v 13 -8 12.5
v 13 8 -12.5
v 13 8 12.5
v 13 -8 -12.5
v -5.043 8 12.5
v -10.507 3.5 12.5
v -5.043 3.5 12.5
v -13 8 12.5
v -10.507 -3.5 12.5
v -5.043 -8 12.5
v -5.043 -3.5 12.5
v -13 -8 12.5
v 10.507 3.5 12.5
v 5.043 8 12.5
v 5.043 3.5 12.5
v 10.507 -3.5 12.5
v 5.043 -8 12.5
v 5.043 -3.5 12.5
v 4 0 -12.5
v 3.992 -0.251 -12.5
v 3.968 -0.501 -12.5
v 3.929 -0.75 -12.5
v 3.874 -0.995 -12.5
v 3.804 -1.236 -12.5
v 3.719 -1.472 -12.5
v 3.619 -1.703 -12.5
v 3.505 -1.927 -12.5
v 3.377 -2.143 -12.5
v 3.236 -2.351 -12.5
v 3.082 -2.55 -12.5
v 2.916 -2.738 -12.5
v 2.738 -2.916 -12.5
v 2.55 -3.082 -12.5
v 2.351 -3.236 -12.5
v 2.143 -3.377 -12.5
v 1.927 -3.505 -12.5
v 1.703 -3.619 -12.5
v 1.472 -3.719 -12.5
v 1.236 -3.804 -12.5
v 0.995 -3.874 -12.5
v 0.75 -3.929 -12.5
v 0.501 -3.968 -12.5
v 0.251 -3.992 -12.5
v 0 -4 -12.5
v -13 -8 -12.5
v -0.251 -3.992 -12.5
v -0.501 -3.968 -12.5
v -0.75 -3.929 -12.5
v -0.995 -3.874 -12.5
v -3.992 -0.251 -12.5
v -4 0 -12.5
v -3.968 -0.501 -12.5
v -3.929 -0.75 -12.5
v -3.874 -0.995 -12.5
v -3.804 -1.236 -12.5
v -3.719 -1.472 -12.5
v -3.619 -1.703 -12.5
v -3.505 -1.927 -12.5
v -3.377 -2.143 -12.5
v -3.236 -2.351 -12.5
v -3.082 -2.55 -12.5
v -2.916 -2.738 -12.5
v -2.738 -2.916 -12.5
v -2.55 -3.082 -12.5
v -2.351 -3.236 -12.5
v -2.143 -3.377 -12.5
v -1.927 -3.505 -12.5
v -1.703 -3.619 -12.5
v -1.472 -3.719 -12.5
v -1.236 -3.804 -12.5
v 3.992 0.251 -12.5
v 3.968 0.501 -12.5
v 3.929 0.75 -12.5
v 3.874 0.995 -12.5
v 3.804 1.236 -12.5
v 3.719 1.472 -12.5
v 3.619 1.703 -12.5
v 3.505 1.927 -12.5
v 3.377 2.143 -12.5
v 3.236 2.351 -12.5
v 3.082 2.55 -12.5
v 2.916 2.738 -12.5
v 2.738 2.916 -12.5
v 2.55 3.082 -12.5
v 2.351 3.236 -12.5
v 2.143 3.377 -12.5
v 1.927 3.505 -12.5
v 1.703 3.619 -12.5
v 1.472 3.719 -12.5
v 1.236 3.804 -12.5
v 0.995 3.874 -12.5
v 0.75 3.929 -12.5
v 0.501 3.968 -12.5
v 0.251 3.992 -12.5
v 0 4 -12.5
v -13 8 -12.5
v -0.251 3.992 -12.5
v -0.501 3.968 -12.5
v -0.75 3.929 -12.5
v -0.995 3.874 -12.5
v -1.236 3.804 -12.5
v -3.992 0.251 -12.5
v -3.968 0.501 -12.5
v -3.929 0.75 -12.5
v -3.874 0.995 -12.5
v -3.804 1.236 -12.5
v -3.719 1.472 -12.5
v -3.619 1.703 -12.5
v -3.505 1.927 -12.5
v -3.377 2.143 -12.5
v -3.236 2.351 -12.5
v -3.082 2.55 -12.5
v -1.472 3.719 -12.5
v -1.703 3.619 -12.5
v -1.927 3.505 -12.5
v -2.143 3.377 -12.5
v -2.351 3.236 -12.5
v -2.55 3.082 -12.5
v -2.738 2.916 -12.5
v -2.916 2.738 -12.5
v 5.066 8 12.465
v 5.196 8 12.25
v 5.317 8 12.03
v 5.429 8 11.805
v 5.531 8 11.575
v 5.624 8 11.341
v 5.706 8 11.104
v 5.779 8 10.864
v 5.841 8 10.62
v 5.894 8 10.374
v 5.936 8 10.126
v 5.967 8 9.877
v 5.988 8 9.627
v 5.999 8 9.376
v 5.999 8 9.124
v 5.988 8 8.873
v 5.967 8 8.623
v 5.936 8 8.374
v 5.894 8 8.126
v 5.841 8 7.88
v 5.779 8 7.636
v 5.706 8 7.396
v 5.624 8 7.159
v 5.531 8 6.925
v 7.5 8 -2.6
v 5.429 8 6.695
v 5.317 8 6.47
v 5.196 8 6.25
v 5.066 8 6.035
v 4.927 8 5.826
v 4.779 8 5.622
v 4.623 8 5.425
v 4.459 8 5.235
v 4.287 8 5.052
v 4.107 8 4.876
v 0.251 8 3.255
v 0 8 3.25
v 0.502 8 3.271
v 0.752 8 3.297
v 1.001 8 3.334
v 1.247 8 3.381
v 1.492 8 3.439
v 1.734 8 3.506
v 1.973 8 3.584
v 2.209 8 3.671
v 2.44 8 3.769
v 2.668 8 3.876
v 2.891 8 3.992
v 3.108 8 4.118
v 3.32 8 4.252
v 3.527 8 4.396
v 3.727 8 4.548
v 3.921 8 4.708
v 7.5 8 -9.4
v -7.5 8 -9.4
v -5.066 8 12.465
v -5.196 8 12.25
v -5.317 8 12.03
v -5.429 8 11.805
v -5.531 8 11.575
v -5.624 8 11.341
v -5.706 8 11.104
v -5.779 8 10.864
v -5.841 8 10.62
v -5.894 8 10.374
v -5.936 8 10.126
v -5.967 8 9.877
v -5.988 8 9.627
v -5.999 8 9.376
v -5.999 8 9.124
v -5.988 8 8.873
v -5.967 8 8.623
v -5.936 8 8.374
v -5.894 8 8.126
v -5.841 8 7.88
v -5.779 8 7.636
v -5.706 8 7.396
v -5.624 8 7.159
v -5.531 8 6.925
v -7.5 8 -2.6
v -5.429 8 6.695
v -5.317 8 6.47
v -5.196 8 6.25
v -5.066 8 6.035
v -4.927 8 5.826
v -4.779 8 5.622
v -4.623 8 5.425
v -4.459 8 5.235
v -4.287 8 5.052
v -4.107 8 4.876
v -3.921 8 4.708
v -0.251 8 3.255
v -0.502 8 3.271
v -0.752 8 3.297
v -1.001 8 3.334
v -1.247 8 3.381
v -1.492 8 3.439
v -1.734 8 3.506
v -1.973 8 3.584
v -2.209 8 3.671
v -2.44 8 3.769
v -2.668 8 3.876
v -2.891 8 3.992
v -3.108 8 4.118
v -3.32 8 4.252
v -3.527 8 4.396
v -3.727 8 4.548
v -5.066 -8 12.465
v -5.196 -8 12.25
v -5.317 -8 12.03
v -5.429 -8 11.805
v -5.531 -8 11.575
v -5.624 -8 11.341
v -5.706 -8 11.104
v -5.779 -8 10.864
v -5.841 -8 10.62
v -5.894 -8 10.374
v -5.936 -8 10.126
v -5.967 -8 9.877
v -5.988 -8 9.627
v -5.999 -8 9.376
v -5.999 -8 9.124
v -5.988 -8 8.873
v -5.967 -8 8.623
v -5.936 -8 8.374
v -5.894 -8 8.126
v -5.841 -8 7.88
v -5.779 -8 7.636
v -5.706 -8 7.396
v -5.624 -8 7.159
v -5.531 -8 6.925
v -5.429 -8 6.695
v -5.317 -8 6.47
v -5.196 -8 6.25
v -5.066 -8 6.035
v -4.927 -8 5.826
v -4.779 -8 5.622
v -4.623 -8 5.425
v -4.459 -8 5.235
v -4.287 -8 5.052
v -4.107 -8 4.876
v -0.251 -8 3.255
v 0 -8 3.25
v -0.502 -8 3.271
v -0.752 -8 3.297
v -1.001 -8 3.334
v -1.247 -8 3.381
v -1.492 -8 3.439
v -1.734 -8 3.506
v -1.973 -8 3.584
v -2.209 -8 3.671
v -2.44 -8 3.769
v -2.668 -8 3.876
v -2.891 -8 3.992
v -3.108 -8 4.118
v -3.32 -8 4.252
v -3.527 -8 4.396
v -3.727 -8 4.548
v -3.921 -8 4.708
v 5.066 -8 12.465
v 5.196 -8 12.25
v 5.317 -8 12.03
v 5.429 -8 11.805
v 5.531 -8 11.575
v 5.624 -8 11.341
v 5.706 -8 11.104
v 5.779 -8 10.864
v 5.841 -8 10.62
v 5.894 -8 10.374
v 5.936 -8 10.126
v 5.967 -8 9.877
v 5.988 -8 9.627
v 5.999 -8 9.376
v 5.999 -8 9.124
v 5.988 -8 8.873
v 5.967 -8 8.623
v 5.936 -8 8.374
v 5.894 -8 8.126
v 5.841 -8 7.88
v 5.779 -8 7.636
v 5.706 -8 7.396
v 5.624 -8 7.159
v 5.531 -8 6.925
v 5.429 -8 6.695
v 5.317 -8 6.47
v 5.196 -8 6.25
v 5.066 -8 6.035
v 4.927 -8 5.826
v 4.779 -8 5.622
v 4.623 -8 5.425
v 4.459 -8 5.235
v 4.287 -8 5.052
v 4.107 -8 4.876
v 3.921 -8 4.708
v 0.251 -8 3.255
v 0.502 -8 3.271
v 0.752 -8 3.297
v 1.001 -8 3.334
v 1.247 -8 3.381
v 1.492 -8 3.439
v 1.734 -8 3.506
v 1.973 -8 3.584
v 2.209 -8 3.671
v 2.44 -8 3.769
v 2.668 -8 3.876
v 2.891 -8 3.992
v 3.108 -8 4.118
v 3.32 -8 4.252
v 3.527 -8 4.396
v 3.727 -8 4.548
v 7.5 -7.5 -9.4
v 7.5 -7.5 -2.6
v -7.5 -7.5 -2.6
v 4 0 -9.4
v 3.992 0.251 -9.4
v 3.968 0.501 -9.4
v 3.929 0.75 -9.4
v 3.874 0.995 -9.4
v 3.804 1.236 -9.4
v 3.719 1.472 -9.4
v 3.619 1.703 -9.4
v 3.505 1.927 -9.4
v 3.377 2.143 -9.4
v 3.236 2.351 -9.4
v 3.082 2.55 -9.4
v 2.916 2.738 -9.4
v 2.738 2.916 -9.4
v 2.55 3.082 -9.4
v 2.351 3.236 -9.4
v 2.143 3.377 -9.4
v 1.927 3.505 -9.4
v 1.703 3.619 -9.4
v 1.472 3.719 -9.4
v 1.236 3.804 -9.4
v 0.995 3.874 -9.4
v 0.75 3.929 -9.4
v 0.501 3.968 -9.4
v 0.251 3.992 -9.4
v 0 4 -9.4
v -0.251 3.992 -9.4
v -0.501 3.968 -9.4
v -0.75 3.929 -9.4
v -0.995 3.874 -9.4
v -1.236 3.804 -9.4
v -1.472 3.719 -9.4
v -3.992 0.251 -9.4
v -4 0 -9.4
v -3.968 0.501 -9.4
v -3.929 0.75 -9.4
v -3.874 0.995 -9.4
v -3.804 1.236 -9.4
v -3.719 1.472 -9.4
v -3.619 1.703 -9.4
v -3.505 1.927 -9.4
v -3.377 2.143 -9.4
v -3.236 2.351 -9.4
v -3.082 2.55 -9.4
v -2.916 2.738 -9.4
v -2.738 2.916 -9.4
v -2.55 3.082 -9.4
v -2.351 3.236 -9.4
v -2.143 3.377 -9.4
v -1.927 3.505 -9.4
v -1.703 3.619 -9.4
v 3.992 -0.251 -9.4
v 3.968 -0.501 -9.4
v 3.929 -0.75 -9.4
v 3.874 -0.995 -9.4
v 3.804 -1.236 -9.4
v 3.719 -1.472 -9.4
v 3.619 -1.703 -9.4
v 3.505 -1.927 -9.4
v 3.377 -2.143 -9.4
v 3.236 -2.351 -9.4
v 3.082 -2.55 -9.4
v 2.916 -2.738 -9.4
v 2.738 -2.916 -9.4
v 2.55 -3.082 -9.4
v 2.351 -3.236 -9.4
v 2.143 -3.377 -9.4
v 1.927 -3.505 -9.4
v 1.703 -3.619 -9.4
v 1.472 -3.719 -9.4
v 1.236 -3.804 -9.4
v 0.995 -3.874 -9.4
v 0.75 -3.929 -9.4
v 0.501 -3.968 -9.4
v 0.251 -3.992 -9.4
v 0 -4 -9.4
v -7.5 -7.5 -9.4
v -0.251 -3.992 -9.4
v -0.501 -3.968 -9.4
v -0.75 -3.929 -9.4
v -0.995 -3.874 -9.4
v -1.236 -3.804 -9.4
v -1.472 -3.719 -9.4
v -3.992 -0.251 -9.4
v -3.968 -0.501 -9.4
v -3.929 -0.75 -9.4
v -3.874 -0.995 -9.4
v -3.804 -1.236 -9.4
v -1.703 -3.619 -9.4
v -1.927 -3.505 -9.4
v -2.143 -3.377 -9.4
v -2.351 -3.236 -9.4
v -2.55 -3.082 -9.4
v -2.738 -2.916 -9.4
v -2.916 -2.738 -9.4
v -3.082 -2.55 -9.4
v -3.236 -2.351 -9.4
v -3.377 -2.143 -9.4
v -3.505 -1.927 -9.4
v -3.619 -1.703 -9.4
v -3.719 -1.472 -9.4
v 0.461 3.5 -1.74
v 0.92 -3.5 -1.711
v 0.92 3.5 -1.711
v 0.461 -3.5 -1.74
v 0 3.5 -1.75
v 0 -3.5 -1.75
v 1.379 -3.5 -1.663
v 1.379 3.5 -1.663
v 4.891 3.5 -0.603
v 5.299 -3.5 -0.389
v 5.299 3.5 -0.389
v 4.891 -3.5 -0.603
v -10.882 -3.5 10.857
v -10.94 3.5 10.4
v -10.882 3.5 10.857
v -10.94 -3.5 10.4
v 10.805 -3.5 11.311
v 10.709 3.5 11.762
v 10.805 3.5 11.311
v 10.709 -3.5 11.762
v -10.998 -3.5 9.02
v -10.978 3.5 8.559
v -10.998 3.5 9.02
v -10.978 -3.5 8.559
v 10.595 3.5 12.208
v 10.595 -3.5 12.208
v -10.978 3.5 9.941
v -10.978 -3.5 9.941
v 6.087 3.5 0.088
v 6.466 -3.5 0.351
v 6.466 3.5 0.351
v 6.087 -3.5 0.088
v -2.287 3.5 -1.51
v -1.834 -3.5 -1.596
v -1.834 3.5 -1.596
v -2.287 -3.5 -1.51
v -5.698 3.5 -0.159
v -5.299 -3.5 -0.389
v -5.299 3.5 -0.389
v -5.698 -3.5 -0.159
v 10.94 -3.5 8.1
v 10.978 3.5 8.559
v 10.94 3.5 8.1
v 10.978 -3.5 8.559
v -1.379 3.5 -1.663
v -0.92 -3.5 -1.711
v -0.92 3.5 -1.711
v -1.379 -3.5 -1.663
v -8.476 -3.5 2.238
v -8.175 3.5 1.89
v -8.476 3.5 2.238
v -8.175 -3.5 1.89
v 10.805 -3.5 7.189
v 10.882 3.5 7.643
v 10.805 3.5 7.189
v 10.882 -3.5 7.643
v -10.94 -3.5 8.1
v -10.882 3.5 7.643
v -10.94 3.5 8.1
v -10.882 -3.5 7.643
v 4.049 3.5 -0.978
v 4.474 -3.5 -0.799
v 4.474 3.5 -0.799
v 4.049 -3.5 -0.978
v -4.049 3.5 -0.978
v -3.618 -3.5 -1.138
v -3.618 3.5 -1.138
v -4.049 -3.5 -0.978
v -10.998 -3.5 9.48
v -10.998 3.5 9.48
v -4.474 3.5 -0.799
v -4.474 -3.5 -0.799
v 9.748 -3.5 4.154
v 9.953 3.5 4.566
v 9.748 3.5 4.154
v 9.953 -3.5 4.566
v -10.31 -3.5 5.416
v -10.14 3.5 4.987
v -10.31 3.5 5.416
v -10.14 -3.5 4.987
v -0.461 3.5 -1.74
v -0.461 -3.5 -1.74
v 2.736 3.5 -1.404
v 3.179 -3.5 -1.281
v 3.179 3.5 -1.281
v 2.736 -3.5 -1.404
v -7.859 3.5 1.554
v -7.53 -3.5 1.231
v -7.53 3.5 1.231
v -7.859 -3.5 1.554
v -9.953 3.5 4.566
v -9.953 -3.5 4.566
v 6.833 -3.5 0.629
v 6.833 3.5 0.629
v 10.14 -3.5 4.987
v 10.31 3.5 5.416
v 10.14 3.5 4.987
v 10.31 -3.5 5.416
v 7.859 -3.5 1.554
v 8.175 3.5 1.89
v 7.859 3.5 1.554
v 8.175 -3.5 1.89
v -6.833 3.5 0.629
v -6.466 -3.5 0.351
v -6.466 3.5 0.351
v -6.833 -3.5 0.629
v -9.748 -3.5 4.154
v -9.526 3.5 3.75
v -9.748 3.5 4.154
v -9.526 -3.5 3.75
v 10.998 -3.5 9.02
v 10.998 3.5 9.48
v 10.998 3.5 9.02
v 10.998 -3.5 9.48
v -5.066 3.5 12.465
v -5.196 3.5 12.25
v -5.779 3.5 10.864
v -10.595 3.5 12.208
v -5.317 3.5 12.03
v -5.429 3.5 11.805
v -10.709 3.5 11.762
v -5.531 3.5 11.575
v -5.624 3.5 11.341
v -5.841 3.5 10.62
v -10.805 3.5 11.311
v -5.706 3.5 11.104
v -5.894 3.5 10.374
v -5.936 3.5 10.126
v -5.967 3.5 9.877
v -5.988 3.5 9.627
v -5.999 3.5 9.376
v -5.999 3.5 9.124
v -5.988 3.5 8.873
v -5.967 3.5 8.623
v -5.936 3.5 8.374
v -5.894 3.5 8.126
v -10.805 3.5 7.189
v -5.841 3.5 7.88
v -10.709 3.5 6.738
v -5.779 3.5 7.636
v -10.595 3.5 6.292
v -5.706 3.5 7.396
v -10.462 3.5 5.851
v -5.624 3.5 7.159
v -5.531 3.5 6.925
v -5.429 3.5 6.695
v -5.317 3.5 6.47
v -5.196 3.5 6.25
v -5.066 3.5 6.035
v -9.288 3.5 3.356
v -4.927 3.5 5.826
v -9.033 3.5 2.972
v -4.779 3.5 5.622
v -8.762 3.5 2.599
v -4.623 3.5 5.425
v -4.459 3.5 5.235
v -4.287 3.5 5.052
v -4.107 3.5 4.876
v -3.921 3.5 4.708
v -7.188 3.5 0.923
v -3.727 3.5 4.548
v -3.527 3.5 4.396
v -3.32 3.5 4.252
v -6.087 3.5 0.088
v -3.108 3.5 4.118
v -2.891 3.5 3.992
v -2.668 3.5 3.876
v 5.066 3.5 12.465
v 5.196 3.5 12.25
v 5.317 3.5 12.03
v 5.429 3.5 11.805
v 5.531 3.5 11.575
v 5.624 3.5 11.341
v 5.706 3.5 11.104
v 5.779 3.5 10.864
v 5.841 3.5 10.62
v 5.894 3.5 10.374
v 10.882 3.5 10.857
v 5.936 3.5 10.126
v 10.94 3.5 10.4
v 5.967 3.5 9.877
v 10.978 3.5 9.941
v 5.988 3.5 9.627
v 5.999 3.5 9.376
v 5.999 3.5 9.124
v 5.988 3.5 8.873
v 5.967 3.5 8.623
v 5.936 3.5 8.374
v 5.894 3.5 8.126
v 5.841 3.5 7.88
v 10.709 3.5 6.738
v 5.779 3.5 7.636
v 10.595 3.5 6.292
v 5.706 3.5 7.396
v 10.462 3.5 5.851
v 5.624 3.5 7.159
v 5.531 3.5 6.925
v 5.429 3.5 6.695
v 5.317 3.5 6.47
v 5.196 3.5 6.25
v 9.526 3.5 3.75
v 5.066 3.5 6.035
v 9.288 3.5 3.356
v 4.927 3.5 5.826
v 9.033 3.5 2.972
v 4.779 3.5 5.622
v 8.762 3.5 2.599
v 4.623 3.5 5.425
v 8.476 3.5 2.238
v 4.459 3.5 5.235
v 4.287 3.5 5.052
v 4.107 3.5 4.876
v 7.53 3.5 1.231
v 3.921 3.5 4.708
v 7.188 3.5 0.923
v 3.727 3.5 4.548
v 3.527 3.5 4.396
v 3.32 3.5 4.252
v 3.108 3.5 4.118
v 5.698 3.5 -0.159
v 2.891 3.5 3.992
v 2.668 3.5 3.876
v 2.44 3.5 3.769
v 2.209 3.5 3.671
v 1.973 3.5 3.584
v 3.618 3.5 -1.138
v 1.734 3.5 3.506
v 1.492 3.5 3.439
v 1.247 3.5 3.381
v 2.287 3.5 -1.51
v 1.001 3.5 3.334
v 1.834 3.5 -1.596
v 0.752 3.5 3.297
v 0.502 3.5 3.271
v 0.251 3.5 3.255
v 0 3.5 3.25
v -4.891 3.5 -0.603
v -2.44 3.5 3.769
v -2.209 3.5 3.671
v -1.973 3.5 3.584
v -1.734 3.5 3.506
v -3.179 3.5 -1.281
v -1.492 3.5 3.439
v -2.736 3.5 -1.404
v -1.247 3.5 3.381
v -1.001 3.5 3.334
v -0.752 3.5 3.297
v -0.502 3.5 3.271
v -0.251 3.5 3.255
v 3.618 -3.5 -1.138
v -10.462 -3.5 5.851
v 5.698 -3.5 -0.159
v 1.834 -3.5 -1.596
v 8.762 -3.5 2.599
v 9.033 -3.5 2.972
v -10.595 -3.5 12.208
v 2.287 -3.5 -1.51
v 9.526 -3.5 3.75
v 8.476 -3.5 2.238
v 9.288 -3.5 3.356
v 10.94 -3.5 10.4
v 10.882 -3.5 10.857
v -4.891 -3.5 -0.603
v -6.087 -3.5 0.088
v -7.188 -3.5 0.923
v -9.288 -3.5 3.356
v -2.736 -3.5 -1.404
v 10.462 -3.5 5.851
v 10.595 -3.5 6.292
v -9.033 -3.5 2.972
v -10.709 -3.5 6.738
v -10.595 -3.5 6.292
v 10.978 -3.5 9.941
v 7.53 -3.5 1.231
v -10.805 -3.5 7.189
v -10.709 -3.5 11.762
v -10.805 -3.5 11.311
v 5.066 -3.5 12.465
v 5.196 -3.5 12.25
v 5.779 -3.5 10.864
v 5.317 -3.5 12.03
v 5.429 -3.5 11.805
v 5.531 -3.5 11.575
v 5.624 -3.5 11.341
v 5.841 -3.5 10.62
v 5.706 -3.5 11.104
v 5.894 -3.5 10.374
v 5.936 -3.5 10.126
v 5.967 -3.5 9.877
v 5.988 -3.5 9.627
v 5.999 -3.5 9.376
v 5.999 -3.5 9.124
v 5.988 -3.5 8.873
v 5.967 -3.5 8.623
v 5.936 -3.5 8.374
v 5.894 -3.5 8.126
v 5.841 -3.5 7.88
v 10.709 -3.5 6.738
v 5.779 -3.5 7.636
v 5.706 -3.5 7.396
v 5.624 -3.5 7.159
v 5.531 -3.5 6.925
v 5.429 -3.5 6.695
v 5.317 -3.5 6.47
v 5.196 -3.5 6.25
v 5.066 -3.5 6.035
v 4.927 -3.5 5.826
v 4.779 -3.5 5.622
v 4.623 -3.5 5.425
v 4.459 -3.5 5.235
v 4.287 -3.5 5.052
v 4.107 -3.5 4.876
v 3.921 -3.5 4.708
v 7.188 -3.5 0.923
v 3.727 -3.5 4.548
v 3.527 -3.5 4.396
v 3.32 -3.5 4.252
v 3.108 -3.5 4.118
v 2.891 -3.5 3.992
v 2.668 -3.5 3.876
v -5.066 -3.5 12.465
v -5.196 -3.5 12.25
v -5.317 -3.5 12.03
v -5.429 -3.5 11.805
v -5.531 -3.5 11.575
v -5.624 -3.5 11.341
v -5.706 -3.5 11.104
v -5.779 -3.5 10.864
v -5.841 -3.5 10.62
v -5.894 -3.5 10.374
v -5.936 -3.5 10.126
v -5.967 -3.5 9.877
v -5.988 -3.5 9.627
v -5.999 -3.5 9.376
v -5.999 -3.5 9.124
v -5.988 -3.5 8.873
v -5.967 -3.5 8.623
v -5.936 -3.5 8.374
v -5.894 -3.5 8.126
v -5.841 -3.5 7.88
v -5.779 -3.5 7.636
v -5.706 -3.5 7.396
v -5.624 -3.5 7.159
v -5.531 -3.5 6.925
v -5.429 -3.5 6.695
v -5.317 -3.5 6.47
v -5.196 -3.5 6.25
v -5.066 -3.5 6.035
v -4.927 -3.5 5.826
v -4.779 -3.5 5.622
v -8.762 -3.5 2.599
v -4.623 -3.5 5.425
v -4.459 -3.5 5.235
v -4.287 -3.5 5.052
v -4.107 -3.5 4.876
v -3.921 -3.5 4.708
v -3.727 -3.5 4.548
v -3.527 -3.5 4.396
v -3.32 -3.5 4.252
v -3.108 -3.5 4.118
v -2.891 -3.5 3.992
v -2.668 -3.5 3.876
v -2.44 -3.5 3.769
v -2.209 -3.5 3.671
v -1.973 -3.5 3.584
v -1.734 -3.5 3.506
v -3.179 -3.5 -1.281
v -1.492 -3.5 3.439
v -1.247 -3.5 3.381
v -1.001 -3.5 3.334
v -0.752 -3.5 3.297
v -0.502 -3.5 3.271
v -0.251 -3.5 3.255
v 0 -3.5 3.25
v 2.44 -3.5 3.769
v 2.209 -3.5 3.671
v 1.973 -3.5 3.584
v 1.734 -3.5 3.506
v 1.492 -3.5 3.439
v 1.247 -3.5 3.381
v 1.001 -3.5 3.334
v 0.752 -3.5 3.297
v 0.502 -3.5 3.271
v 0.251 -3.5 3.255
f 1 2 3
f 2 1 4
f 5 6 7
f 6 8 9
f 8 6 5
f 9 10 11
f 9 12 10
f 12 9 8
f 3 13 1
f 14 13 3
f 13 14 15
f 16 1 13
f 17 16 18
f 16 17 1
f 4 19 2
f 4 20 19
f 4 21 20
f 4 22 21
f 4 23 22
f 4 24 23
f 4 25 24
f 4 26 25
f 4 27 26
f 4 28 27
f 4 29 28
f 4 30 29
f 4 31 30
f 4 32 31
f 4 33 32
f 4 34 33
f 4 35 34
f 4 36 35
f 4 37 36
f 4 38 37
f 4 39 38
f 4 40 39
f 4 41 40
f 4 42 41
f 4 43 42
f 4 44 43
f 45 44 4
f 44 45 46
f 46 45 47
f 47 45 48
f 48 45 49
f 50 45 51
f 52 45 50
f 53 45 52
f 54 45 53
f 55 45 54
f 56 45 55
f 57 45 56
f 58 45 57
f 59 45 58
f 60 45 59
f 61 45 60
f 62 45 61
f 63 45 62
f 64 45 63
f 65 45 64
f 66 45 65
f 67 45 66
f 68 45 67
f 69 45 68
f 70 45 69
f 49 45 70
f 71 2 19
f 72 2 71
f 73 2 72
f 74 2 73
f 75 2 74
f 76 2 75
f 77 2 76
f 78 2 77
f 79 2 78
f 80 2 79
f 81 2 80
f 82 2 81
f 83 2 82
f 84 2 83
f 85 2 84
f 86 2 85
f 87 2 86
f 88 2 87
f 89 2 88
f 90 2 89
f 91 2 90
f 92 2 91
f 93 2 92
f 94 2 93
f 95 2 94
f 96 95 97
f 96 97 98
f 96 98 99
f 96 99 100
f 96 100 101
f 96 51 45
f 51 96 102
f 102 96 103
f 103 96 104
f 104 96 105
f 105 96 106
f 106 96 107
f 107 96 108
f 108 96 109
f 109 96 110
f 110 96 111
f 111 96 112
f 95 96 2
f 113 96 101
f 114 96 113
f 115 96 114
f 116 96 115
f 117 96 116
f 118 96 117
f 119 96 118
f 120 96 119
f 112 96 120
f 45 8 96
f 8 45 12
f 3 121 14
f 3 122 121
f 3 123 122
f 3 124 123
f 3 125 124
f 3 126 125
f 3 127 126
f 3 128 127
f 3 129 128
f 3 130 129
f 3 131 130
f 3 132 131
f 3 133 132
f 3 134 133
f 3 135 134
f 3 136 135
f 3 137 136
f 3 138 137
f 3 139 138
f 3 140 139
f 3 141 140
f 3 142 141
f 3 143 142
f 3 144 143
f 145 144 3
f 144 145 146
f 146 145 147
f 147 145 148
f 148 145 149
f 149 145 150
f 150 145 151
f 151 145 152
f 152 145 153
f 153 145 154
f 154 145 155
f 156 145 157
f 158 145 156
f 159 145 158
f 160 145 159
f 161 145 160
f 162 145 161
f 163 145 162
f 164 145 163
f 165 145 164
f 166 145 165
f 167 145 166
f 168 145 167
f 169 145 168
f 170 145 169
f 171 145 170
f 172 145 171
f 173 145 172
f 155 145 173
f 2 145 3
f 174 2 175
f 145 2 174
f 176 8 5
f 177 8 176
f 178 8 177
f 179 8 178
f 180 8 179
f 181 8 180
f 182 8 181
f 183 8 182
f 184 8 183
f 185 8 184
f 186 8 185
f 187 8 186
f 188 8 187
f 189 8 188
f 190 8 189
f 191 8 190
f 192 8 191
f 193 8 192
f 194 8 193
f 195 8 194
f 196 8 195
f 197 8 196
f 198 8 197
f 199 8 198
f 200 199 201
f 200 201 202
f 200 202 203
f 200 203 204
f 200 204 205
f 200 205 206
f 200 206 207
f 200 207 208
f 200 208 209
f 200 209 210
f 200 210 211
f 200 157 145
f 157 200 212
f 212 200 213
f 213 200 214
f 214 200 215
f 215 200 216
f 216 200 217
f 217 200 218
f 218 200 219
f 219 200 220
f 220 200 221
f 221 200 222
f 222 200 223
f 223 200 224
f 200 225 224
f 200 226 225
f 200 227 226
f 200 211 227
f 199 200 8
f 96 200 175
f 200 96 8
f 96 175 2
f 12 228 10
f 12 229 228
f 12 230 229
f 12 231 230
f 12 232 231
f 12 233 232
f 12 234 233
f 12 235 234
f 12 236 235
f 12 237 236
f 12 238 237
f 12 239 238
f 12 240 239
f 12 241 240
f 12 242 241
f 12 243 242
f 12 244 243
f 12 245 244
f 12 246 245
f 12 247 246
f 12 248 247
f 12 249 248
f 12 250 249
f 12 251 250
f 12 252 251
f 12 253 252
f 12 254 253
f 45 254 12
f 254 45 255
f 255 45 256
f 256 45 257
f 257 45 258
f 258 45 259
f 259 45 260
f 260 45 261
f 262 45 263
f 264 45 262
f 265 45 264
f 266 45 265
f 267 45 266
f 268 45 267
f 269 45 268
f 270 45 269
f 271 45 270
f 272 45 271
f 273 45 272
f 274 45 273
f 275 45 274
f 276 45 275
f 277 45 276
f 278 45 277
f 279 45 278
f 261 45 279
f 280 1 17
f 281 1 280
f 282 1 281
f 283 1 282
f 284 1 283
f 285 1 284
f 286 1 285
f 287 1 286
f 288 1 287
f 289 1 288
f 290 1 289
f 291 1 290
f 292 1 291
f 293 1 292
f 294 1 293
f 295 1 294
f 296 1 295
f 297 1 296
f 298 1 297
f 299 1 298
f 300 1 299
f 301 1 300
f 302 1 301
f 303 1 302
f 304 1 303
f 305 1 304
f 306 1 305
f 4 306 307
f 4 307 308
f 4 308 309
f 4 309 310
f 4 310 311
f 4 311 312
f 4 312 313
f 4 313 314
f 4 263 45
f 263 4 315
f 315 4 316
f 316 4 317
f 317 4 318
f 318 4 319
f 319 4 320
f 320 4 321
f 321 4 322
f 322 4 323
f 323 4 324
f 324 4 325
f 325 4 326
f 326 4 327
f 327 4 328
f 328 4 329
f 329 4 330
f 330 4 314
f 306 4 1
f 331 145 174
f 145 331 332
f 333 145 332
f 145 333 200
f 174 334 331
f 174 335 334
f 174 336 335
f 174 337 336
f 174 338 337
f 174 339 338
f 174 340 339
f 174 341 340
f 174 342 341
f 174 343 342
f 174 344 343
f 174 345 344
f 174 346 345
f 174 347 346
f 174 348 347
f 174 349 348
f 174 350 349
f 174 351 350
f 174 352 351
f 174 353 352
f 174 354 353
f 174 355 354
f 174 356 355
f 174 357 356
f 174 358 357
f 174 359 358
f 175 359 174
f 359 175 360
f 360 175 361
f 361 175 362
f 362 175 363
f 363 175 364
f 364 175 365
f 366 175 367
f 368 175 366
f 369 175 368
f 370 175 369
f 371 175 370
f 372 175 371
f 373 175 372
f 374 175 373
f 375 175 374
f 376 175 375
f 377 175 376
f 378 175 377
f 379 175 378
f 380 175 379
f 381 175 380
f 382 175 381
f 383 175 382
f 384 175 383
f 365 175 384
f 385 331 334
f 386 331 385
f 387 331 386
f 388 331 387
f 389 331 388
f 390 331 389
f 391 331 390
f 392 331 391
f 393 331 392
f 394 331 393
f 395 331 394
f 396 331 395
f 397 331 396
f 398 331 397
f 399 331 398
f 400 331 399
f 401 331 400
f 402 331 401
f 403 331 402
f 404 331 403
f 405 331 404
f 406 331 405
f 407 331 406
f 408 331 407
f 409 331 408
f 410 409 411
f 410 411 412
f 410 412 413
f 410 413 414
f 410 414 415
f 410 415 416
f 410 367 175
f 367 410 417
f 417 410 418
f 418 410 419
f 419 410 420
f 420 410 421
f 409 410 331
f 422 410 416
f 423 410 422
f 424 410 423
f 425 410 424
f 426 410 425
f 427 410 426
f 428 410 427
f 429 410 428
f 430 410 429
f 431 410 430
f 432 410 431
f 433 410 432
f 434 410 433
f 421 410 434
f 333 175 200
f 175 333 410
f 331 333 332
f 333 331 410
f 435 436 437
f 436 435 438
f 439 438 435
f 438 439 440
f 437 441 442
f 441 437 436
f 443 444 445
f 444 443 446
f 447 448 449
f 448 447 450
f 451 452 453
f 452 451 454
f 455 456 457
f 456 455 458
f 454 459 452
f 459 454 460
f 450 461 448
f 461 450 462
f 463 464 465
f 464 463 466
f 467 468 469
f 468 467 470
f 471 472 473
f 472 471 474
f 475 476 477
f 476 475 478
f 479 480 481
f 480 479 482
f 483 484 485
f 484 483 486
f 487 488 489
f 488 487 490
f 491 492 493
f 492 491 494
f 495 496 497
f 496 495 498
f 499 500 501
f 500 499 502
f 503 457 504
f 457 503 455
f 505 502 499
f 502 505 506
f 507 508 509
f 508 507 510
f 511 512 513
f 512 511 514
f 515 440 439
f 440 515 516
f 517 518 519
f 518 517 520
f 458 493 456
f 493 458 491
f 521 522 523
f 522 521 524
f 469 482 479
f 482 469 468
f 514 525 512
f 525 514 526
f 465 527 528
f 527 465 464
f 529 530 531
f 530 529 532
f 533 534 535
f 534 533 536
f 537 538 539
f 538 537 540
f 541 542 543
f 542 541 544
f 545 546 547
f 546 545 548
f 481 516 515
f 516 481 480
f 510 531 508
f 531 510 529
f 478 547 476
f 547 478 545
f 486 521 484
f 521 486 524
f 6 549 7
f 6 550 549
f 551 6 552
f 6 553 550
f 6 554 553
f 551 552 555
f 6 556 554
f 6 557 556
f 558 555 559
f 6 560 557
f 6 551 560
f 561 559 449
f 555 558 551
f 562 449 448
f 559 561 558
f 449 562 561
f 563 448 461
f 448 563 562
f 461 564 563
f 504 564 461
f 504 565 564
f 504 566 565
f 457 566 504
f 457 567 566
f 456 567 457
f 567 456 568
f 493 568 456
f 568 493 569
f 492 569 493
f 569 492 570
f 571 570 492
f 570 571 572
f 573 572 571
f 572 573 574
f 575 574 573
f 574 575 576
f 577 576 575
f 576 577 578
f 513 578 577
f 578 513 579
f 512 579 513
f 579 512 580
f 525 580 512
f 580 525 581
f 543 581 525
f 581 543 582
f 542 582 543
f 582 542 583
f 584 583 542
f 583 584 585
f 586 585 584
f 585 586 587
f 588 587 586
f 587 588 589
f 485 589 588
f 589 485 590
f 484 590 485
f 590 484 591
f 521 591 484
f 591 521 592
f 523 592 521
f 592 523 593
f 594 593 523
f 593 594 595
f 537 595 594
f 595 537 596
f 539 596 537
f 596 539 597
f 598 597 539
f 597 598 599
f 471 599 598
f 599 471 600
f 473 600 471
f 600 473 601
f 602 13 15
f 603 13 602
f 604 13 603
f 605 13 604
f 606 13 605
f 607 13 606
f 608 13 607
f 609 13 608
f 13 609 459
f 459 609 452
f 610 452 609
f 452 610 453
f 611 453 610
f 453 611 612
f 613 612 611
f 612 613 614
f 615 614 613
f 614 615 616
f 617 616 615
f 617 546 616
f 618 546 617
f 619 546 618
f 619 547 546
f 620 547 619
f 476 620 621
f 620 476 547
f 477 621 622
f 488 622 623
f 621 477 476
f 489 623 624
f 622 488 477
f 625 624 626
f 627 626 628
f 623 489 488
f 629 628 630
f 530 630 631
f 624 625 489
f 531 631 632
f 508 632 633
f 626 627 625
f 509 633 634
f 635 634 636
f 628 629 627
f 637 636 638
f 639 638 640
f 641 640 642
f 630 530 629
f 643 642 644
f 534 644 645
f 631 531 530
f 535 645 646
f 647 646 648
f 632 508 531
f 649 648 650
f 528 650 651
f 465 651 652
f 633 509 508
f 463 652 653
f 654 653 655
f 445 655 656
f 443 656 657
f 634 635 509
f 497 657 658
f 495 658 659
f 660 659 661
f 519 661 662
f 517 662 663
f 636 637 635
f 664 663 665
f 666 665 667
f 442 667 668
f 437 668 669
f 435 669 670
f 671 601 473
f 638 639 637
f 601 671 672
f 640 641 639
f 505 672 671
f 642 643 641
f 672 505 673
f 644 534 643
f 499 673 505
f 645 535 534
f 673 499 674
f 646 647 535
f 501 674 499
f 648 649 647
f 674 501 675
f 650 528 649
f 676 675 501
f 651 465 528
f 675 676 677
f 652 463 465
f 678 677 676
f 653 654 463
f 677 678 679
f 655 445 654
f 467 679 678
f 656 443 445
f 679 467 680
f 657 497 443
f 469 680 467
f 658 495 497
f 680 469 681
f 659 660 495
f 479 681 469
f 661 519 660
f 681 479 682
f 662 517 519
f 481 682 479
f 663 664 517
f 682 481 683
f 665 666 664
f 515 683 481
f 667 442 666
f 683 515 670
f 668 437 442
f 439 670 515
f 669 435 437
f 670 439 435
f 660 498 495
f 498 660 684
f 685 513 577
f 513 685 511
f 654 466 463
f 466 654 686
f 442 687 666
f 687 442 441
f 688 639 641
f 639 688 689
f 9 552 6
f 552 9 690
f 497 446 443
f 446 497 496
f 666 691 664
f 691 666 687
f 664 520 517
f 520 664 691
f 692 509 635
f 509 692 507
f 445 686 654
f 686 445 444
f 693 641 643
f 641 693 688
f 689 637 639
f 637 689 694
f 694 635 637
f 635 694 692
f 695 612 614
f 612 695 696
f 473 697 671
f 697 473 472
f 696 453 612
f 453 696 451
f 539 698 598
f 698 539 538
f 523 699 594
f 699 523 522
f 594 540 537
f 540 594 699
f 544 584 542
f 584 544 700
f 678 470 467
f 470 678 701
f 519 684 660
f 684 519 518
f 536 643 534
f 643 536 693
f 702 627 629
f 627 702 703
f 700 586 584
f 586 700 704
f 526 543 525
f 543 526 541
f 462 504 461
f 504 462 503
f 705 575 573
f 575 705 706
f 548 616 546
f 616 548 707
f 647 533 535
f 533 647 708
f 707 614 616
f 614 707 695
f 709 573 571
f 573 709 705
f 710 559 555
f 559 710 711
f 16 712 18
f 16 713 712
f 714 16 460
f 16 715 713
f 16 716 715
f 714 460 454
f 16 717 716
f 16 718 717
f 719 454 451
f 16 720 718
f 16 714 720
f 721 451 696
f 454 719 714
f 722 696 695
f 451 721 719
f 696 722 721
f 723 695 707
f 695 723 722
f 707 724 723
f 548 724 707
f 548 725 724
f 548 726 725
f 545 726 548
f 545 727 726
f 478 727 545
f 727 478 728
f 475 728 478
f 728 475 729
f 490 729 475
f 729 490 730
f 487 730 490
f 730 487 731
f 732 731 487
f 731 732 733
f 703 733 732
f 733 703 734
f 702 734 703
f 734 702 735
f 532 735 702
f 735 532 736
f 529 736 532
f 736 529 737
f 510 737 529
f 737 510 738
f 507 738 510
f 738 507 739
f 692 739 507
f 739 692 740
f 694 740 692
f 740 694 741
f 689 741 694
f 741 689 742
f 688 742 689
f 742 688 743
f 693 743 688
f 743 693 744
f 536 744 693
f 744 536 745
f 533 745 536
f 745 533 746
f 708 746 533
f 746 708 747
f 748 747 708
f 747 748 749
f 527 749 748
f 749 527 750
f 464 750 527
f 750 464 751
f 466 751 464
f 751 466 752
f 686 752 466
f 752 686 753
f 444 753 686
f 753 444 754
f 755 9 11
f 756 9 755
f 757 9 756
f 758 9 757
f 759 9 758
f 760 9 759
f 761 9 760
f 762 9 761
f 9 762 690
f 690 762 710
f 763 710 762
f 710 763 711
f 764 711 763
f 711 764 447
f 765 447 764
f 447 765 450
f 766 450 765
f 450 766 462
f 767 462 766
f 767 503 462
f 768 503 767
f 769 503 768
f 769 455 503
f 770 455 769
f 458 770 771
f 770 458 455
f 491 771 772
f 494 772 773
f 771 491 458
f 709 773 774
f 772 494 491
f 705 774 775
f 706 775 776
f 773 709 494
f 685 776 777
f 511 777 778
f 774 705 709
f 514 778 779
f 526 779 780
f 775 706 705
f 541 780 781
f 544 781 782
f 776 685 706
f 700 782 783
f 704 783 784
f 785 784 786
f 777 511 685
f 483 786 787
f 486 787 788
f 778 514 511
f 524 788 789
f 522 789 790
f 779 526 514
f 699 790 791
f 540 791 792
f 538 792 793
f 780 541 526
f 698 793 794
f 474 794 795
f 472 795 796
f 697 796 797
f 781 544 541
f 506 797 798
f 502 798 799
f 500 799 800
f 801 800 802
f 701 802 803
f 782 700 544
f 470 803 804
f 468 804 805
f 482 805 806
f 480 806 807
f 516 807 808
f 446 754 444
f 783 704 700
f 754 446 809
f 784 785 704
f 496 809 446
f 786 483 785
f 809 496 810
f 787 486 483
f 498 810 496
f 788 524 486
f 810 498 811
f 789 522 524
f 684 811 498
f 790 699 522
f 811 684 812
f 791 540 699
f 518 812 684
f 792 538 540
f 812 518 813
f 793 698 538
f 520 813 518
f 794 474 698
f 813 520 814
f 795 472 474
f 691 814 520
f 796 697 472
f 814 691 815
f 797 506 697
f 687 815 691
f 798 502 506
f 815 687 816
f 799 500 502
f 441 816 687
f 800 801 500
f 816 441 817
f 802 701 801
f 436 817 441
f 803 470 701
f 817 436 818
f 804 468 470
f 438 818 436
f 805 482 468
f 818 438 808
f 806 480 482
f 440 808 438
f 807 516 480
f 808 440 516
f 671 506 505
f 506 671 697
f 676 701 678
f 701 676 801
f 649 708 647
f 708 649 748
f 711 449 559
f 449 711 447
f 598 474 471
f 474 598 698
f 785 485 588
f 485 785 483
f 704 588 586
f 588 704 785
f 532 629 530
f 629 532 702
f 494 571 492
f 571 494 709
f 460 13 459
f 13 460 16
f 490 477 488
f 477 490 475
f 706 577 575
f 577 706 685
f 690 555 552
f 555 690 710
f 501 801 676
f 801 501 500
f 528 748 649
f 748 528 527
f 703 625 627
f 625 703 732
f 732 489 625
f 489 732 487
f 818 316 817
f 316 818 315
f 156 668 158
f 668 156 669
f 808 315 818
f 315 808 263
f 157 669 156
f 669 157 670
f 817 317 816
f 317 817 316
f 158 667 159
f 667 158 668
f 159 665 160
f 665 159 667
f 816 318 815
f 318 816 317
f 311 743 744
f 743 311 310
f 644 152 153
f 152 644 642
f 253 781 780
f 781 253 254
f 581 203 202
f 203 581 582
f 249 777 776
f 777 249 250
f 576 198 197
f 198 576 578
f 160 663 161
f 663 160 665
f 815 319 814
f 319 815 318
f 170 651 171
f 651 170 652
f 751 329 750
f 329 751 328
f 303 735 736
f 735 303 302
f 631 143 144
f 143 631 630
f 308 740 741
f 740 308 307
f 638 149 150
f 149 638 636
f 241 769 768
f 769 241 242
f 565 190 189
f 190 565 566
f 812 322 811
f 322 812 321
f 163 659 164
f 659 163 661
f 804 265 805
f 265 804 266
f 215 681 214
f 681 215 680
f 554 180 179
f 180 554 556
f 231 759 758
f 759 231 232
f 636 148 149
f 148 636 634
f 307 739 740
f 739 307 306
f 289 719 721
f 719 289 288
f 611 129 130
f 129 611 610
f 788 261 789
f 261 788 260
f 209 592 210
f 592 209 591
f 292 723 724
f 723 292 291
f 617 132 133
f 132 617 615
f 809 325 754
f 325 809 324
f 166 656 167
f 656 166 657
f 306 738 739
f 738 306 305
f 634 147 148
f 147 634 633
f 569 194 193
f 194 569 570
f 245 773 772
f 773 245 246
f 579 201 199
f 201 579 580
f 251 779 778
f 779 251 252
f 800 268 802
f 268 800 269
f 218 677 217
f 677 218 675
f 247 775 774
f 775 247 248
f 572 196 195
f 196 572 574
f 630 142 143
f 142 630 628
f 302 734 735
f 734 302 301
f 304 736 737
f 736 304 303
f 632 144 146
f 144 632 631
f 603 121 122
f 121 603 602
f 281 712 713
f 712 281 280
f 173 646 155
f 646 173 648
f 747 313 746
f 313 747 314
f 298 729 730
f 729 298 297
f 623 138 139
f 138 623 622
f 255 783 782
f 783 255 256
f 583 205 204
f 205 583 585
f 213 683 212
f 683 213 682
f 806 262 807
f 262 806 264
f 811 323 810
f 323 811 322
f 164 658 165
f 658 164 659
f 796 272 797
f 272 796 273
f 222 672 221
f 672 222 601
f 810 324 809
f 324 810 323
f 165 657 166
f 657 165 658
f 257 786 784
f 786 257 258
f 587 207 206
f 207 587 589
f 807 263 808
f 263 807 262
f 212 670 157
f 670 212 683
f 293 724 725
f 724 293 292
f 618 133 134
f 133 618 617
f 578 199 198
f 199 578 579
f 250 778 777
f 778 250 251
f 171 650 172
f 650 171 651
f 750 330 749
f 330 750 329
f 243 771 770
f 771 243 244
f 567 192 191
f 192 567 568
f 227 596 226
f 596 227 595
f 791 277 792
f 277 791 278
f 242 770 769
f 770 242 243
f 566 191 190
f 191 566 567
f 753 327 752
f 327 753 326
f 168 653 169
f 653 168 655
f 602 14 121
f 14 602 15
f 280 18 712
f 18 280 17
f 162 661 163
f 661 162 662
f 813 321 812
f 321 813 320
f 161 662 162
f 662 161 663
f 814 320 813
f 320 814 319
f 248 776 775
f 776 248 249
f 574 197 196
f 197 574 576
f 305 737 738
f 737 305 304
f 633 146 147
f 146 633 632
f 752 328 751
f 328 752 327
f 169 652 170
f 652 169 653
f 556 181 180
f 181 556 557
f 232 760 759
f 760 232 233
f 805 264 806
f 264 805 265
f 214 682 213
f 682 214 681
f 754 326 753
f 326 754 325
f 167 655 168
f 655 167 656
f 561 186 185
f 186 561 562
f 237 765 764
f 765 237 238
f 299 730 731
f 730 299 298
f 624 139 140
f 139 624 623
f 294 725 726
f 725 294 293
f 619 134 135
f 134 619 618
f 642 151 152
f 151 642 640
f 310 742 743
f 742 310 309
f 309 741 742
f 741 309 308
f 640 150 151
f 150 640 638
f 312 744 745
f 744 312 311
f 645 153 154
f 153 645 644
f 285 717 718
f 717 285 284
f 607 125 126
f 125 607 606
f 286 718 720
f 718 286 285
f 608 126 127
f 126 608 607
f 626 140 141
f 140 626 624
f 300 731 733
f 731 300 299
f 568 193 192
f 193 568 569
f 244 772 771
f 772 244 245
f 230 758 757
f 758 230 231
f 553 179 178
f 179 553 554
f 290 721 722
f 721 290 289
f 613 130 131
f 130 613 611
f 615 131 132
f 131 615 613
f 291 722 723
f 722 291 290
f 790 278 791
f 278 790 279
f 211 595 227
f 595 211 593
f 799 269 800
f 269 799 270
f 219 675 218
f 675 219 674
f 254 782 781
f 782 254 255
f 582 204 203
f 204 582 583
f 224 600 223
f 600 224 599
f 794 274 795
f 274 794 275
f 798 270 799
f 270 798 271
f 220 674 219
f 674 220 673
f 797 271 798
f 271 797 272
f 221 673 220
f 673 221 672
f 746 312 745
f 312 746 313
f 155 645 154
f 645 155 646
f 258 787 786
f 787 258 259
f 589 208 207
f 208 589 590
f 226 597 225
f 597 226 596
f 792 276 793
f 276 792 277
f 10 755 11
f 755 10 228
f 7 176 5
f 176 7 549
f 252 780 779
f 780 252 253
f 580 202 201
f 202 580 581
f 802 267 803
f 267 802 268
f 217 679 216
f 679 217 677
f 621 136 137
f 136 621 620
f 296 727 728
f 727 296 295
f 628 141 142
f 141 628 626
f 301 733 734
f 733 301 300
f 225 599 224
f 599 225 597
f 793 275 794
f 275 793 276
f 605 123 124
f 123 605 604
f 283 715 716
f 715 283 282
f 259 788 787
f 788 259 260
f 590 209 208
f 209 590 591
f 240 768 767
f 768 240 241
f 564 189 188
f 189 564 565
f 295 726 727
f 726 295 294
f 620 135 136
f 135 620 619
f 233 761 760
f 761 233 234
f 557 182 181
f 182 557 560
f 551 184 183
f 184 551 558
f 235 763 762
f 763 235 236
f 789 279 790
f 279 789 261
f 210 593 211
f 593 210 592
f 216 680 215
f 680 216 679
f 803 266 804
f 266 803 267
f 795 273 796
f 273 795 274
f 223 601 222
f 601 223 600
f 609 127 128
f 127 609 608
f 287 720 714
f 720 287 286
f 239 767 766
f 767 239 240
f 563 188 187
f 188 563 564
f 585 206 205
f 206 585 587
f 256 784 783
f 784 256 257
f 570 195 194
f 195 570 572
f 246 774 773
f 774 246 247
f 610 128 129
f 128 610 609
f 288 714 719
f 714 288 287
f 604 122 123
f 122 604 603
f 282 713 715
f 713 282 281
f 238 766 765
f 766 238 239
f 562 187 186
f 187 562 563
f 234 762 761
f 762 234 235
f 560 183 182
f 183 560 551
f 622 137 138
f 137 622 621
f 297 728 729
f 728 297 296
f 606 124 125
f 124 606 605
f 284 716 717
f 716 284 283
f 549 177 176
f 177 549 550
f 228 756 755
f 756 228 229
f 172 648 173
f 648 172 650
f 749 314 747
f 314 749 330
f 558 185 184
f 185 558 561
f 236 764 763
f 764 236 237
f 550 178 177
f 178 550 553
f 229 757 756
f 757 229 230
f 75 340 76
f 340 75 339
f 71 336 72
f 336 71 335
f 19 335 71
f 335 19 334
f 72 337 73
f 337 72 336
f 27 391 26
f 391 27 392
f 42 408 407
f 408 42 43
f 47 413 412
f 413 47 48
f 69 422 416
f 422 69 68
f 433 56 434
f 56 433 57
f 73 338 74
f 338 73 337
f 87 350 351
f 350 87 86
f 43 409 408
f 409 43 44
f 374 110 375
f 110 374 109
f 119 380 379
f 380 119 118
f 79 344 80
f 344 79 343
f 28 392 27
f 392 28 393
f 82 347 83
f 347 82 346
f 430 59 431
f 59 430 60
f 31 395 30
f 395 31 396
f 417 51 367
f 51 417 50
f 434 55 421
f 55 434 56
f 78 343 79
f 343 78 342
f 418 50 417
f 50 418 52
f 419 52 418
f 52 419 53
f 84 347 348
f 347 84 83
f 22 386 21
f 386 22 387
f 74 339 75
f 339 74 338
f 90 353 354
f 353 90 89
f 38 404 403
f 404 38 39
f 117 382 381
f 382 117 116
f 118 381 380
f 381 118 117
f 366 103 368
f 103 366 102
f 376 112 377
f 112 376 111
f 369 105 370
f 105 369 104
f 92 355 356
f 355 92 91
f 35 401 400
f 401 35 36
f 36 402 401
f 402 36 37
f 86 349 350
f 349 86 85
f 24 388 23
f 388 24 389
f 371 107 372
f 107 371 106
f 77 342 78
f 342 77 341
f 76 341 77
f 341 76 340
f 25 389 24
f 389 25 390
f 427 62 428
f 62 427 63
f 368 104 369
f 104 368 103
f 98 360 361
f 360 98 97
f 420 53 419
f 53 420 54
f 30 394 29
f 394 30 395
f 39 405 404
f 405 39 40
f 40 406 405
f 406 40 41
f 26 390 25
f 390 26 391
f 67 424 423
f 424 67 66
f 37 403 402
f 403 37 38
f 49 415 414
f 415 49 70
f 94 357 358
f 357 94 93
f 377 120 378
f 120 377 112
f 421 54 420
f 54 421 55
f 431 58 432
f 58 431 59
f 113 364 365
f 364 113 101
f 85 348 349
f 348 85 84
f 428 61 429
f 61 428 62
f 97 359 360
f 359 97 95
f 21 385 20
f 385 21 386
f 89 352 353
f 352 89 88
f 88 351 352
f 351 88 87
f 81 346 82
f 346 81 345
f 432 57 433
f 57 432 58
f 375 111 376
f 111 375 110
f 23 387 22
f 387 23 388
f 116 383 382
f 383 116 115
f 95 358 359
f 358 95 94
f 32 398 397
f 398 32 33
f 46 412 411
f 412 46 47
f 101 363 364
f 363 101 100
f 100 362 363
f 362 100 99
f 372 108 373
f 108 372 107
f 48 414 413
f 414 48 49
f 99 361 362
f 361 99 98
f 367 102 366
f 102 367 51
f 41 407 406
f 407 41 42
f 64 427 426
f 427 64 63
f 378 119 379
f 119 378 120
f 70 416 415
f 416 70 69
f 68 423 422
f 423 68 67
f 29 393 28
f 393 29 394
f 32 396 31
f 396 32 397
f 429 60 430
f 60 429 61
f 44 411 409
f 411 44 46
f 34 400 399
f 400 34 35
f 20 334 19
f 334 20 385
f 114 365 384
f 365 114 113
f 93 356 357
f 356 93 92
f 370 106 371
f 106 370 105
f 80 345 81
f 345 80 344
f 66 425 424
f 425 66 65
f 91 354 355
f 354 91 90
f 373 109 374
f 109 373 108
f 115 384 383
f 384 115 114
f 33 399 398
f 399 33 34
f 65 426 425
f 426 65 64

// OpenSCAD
//---------------------------------------------------------------------
//  Spool holder for Prusa i3 with 6mm aluminium Frame   
//  (c)iPadNanito <@iPadNanito> , March-2013                        
//---------------------------------------------------------------------

bearing_exterior = 22;
bearing_interior = 12;
bearing_width = 7;

module bearing_support()
{
	difference()
	{
		difference()
		{
			cube([26,16, 25], center = true); // Piece body
			
			translate([0,0.25,-6])
			#cube([15,15.5,6.8], center = true); // Hole where inserts M8 nut 
		}

		translate([0,0,9.25])
		rotate([90,90,0])
		bearing_with_rod();  // Hole for the bearing with the threaded rod

		translate([0,0,-15])
		cylinder(r=8/2, h=20, $fn=100, center = true); // M8 hole for threaded rod

	}
}

module bearing_with_rod()
{
		color("grey")
		cylinder(r=bearing_exterior/2, h=bearing_width, $fn=150, center=true); // Bearing body

		cylinder(r=bearing_interior/2, h=bearing_width+40, $fn=150, center=true); // M8 threaded rod
}

bearing_support();
